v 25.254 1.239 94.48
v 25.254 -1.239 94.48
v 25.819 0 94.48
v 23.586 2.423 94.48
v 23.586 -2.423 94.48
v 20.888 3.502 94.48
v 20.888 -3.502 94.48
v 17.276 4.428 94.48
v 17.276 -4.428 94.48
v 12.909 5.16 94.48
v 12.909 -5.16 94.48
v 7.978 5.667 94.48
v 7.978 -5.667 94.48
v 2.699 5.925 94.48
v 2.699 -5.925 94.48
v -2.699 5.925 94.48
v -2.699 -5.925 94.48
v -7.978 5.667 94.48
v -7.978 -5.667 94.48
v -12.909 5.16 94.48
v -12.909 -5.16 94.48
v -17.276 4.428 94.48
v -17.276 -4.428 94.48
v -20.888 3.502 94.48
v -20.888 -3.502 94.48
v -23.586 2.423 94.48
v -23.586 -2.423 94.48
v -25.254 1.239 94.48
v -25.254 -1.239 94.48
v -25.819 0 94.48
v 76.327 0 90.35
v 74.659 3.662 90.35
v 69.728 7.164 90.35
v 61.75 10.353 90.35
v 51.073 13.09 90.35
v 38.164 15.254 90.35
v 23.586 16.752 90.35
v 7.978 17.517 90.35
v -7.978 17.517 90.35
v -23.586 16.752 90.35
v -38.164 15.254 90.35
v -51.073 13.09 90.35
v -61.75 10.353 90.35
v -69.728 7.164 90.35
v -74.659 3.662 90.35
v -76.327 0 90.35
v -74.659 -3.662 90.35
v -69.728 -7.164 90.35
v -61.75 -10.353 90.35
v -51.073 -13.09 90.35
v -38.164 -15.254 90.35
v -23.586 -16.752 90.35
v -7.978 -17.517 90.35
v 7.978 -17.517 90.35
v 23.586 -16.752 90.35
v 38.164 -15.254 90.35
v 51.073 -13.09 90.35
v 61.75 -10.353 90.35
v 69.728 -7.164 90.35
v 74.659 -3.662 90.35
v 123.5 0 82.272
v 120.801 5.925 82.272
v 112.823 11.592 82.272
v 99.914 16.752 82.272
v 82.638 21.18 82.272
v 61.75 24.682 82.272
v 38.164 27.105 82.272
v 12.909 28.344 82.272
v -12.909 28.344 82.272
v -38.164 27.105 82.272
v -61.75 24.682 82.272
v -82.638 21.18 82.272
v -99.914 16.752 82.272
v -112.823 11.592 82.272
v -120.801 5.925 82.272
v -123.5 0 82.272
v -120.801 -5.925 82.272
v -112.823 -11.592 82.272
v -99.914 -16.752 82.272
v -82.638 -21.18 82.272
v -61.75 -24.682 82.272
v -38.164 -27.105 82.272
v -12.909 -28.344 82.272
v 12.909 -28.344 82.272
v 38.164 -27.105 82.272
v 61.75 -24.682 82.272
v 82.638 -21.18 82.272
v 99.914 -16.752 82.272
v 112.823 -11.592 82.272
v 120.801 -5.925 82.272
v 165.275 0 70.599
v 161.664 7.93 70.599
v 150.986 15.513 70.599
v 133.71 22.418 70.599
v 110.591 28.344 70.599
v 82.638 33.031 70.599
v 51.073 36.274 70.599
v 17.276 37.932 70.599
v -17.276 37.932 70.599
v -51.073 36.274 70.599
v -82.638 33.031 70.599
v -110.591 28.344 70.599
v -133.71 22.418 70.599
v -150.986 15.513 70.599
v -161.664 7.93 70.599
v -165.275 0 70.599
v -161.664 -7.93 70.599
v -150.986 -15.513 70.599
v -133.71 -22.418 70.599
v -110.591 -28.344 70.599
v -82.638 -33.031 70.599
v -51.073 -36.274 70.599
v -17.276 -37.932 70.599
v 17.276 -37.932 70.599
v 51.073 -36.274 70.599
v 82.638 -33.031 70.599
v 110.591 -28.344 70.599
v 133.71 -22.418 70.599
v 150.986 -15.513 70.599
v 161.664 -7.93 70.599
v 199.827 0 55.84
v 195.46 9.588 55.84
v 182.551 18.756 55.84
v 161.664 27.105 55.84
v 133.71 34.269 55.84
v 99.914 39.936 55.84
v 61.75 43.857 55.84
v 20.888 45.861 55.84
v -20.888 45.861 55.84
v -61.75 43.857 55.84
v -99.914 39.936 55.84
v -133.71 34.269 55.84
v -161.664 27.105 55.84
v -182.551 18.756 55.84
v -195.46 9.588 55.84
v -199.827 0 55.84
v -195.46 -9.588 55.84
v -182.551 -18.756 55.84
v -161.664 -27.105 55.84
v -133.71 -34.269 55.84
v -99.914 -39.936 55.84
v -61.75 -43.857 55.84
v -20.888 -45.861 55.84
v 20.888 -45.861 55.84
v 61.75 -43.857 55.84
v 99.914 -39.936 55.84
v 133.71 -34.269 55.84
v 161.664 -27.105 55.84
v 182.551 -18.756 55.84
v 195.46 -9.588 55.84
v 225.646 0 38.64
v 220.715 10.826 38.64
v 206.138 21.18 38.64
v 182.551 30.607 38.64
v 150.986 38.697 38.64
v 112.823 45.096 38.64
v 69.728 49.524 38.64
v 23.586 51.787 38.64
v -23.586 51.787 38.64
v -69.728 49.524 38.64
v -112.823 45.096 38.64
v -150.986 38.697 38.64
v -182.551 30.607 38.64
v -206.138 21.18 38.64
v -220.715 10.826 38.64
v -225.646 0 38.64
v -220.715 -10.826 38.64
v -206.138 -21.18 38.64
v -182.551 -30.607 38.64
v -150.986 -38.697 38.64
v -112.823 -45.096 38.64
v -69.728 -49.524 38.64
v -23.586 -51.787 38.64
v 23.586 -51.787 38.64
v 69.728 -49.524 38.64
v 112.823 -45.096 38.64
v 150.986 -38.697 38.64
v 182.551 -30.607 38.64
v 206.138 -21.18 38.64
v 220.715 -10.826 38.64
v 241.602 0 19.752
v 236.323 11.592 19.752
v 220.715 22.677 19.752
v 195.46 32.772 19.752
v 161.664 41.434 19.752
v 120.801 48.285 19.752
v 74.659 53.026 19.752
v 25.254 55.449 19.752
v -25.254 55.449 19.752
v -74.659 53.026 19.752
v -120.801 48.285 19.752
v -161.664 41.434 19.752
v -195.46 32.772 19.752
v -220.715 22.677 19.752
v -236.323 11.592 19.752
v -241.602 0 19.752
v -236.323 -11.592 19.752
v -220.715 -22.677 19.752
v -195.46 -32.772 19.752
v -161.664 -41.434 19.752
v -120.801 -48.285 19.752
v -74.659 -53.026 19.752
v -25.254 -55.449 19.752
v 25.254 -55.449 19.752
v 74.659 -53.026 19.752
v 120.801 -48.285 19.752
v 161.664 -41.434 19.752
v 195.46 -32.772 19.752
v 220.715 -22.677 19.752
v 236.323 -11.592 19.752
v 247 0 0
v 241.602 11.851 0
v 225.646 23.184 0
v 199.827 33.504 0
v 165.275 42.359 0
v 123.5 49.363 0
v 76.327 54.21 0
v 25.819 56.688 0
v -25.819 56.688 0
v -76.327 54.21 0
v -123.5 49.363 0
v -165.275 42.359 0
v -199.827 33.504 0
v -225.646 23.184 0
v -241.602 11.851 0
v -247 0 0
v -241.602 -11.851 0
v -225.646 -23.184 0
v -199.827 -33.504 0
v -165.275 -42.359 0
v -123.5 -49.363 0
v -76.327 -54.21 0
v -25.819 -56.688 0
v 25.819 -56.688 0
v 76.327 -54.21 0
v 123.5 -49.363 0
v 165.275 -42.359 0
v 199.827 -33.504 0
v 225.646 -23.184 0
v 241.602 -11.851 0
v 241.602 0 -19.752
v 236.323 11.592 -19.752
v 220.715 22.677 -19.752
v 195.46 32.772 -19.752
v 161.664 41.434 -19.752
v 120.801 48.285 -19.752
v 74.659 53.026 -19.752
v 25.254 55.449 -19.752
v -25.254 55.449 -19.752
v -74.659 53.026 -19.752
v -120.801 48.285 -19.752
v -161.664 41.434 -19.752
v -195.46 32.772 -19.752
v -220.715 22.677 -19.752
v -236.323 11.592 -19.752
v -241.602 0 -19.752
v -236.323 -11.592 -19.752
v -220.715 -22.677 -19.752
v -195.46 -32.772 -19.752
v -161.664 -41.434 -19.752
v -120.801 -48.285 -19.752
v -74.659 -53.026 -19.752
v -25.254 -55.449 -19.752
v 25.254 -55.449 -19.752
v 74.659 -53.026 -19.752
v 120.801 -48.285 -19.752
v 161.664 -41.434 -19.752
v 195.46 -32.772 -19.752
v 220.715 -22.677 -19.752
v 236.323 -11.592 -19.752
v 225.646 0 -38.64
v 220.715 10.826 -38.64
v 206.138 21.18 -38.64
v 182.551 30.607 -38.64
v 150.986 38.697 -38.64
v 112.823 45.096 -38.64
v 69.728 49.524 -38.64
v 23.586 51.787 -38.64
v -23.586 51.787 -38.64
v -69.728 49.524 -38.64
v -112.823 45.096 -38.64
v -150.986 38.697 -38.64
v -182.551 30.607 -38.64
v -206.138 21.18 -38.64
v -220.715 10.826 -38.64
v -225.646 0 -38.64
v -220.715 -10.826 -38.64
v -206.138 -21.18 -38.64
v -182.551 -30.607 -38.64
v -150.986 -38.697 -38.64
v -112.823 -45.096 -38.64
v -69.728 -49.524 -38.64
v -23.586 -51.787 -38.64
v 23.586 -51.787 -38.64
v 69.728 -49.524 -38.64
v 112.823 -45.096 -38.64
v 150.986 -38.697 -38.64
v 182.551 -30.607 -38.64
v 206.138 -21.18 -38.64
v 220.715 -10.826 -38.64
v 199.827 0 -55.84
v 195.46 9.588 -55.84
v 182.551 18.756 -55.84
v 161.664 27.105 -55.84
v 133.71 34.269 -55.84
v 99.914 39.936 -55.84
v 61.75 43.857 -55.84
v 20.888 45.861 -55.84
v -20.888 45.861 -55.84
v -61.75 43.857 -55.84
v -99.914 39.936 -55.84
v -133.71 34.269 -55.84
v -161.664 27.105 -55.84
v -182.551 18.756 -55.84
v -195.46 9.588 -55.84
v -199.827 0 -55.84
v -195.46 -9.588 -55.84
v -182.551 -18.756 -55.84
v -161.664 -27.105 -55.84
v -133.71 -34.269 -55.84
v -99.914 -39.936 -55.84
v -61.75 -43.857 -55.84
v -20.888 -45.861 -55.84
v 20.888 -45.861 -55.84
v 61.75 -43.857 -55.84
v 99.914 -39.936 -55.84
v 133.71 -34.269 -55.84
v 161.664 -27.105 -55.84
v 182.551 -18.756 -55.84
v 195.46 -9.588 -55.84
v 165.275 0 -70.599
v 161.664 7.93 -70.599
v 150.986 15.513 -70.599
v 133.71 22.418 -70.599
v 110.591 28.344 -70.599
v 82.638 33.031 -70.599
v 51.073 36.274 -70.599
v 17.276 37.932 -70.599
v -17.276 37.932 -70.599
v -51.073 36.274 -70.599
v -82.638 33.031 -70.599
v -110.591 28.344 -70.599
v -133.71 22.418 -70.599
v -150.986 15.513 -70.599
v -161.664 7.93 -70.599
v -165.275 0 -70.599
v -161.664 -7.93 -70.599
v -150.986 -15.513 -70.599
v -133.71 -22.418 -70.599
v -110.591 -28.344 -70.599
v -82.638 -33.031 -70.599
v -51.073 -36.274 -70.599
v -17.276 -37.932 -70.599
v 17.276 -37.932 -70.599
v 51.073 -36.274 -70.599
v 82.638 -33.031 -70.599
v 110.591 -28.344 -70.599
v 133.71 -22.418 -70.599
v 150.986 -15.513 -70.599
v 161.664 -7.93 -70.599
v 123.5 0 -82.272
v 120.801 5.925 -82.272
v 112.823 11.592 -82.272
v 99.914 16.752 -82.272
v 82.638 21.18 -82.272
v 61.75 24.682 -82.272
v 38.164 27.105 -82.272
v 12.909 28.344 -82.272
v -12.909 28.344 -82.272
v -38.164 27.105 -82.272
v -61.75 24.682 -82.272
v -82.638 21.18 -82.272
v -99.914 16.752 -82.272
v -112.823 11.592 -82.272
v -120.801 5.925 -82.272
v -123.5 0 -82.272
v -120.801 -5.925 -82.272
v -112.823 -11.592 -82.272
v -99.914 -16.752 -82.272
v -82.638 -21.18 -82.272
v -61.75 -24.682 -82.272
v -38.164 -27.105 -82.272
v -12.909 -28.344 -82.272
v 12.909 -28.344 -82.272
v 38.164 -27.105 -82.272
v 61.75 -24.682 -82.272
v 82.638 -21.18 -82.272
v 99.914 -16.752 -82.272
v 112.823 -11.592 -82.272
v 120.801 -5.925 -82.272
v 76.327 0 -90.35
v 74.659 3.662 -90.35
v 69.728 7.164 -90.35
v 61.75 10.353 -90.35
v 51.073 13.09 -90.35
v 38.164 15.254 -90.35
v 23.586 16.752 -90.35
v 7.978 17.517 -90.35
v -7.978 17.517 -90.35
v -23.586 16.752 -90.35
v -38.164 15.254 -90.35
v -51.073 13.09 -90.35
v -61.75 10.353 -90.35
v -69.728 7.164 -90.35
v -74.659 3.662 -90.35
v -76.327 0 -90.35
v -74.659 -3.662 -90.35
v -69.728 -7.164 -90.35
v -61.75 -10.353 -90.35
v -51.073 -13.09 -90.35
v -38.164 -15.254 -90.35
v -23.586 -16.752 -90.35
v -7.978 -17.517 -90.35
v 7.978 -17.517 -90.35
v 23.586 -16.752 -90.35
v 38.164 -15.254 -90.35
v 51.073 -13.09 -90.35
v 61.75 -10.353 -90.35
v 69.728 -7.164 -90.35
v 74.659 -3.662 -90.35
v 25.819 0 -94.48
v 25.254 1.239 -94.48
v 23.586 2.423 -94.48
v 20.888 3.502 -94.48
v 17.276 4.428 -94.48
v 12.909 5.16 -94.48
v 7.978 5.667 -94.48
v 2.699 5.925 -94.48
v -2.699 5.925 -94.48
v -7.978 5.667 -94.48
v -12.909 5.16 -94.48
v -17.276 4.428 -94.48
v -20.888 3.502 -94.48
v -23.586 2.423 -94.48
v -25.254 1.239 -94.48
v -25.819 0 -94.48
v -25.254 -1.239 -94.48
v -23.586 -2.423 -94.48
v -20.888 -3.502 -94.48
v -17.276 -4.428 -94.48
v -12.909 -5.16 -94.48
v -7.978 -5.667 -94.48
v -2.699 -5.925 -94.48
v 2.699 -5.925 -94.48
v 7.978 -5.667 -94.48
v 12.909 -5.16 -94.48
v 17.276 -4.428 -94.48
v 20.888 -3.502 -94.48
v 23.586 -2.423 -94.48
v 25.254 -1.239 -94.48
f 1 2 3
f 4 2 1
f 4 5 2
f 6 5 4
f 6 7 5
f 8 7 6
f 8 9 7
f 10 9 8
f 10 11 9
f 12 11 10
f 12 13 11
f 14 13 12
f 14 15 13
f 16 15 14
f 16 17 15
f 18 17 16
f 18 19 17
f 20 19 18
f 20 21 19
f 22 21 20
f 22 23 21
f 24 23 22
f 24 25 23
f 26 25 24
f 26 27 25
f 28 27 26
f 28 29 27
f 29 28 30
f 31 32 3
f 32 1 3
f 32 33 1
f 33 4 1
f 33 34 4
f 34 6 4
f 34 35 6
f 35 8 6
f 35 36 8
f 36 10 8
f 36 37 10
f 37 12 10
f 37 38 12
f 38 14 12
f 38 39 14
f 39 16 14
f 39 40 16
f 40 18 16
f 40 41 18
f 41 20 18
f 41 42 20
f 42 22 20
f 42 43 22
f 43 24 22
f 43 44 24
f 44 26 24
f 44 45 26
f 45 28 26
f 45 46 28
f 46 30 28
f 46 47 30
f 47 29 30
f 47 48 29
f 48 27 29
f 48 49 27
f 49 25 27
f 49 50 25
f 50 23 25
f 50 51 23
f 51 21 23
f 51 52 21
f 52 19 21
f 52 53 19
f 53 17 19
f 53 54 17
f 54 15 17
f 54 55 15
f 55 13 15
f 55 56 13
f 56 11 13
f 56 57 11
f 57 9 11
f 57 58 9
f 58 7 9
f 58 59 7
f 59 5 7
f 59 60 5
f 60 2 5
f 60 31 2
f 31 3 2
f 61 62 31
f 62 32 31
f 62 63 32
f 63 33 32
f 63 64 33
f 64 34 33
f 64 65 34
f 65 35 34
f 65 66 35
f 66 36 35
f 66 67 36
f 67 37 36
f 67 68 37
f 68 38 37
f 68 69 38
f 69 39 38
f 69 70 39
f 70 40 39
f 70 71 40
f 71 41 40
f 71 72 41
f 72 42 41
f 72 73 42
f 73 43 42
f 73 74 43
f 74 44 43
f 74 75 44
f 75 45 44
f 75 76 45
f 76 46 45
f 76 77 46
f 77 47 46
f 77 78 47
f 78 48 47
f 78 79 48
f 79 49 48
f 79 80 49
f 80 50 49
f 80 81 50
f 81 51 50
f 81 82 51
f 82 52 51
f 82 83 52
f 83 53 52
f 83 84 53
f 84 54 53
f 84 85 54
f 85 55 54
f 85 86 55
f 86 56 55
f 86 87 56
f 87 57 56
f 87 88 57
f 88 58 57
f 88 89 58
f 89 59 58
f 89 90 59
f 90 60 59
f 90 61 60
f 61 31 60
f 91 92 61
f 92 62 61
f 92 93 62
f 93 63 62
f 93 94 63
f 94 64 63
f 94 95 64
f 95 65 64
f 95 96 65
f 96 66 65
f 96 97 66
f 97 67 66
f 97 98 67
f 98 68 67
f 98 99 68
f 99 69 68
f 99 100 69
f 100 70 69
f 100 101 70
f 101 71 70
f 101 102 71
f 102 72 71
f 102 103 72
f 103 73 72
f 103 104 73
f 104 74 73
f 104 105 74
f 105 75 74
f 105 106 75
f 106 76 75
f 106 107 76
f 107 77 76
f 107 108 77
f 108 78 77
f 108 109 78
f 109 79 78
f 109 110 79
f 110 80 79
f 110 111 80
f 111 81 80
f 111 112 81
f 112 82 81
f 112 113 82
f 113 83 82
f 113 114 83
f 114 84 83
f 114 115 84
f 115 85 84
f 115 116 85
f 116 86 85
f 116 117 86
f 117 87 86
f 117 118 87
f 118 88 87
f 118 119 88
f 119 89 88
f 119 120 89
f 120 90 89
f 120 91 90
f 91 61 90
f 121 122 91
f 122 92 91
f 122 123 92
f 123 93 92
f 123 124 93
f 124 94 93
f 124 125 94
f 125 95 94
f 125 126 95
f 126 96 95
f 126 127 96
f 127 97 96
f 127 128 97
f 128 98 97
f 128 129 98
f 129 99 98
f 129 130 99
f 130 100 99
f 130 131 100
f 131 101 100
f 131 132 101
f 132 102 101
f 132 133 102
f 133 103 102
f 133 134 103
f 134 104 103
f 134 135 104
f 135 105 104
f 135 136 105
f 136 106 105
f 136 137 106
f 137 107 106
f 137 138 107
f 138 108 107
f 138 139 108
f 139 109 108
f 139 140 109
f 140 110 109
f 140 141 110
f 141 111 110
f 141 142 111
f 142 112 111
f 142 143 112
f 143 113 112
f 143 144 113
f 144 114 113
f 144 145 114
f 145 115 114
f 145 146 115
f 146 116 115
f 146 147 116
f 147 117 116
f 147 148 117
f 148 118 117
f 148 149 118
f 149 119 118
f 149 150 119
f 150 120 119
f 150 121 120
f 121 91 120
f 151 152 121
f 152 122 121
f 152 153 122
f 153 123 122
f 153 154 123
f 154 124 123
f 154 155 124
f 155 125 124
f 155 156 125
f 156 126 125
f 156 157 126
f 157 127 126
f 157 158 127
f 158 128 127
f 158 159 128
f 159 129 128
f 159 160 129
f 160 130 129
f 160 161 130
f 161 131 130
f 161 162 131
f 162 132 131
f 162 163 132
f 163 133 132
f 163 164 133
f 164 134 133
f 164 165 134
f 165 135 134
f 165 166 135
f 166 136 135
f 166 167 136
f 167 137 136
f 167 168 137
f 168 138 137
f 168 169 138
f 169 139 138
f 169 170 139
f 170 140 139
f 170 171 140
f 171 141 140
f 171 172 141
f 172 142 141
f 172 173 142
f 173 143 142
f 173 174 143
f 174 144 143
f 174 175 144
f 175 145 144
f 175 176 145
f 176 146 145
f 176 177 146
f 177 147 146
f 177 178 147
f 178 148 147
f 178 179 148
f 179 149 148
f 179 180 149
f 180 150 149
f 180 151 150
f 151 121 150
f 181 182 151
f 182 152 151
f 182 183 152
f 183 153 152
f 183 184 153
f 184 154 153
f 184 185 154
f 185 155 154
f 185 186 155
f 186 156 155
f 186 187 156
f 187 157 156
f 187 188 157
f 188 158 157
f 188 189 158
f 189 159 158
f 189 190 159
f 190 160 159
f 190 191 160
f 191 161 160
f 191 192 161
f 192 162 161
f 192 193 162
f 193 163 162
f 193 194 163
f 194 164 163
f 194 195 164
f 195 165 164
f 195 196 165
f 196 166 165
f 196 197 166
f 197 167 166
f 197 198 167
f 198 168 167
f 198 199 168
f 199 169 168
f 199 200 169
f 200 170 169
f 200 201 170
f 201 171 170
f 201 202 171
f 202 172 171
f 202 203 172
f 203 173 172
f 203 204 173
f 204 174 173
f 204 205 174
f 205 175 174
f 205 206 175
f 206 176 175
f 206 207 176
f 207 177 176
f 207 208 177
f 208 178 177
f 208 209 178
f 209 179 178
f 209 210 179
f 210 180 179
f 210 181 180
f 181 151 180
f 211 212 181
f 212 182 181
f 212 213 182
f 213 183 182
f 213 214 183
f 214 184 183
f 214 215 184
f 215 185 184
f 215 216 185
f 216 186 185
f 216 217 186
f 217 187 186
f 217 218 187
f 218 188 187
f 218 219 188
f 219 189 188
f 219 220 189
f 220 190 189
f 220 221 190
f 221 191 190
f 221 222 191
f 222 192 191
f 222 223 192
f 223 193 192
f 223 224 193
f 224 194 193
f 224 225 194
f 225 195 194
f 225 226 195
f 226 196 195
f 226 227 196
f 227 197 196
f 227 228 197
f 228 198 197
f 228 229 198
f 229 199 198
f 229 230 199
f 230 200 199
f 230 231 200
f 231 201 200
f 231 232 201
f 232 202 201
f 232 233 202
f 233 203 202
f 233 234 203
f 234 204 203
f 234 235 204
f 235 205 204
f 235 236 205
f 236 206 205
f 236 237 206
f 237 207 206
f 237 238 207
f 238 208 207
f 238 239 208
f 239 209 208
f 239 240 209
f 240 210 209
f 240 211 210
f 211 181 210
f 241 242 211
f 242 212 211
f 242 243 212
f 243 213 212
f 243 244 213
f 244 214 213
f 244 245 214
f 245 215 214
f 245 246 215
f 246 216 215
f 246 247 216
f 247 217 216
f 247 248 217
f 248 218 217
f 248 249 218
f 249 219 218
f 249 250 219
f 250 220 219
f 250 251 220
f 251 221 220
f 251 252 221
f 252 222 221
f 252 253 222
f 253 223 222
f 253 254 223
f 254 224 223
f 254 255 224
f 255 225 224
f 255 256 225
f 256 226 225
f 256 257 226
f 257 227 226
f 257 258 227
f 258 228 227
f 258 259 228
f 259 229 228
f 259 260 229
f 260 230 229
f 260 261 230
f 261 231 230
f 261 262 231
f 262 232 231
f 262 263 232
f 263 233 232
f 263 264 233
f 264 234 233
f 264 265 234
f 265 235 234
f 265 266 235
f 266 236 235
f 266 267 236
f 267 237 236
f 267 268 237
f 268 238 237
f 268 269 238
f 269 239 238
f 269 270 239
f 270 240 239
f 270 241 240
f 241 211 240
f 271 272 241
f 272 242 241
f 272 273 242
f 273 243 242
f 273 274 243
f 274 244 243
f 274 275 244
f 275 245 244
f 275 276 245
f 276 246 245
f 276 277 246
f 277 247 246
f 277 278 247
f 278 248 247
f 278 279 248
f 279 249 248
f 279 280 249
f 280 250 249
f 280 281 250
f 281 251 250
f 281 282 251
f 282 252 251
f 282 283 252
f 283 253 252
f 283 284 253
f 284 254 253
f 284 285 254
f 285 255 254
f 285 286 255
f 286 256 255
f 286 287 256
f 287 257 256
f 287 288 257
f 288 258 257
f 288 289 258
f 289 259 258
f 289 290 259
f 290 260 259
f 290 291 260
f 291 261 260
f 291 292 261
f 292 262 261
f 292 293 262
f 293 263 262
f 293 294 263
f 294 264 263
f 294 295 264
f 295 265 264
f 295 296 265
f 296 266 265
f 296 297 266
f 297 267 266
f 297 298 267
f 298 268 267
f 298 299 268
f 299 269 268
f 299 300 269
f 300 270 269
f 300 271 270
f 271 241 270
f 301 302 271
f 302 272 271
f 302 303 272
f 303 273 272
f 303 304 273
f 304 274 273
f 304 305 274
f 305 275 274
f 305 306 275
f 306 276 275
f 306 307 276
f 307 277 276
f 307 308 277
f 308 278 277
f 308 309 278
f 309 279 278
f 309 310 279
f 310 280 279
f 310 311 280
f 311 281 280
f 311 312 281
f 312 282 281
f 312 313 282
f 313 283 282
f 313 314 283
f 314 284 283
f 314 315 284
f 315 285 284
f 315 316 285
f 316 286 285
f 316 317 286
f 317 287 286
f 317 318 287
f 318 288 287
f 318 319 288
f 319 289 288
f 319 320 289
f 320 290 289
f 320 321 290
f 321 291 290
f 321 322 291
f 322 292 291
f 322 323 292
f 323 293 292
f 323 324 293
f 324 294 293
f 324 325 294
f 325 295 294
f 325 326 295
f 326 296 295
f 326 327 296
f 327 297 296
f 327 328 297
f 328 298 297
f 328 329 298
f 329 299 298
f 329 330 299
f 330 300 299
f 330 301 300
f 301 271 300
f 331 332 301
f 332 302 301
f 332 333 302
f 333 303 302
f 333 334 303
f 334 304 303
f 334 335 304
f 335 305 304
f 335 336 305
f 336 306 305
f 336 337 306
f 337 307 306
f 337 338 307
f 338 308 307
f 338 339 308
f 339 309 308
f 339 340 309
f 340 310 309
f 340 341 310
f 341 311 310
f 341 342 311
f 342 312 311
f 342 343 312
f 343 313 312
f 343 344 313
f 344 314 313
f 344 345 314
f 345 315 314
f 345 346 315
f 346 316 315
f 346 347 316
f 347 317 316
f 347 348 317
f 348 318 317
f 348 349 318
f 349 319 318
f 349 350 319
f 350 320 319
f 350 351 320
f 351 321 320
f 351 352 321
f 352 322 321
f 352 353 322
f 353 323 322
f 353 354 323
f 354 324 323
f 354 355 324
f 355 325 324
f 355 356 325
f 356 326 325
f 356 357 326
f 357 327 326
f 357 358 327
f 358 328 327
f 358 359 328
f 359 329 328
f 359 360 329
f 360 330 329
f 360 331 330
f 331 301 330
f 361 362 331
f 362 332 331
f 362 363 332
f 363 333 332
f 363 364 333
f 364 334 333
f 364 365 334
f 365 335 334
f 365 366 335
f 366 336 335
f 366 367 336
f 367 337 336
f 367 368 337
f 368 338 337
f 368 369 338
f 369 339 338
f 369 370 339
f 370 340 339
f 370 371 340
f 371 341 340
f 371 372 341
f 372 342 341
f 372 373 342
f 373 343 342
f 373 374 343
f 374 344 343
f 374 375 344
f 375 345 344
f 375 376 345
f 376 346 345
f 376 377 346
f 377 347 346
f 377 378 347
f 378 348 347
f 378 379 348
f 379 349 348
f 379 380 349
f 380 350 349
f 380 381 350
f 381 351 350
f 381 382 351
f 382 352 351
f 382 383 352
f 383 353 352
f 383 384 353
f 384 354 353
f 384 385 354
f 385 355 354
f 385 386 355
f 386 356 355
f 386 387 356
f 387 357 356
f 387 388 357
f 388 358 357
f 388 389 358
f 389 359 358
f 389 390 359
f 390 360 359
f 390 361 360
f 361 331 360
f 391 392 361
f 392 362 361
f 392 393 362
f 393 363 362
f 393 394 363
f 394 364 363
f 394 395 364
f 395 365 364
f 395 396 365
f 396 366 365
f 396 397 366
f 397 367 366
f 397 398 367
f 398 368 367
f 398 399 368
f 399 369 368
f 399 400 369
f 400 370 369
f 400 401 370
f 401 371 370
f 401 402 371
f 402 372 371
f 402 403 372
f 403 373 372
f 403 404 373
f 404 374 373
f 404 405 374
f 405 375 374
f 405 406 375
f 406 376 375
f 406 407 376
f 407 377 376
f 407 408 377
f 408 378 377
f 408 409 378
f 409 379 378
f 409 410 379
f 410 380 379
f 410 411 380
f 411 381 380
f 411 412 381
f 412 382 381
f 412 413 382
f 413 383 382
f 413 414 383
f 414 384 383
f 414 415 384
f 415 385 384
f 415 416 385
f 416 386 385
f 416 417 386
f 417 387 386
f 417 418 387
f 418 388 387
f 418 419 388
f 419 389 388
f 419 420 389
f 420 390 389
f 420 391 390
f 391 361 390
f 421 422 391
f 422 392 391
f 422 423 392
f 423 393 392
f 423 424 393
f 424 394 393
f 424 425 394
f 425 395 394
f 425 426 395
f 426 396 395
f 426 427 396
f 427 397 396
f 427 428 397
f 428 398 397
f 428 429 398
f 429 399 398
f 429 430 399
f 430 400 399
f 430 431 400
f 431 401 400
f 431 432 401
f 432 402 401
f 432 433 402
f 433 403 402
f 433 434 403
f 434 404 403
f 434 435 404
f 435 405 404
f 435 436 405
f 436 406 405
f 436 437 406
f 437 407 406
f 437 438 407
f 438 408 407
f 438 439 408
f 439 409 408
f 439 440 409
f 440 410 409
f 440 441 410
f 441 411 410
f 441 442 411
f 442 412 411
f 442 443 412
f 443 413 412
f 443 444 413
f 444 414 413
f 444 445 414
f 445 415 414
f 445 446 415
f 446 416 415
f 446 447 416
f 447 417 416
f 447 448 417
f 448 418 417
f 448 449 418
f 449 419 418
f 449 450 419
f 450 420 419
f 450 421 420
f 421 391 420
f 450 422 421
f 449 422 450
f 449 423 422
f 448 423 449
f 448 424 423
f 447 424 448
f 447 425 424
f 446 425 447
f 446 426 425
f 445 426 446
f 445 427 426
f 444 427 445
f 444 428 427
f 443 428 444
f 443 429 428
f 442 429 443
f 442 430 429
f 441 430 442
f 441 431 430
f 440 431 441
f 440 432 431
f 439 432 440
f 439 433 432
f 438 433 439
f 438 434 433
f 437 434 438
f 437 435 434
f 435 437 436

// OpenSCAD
// Generated by SolidPython 1.0.1 on 2020-07-29 00:46:50


scale(v = [13, 3, 5]) {
	sphere(r = 19);
}
/***********************************************
*********      SolidPython code:      **********
************************************************
 
# import packages: SolidPython
from solid import *
from solid.utils import *
from itertools import chain, combinations, permutations


class Resize:

    def __init__(self, scad_file):
        self.scad_file = scad_file
        #self.scad_file = import_scad(scad_file)
        # cone/cylinder param:
        self.r1 = 0
        self.r2 = 0
        self.h = 0
        # rectangular prism param:
        self.w = 0
        self.l = 0
        # ellipse param:
        self.r = 0

    # import OpenScad code (file name corresponds to shape)


    # classify shape + parameters
    def assign(self, param1, param2, param3):
        if self.scad_file == 'cone.scad':
            self.r1 = param1
            self.r2 = param2
            self.h = param3
        elif self.scad_file == 'cylinder.scad':
            self.r1 = param1
            self.r2 = param2
            self.h = param3
        elif self.scad_file == 'rectangularPrism.scad':
            self.h = param1
            self.l = param2
            self.w = param3
        else:
            self.r = param1
            self.h = param2

    # resize parameters
    def iterate(self):
        x = range(3, 20, 2)
        i = 1
        if self.scad_file == 'cone.scad':
            tempList = list(permutations(x, 2))
            for temp in tempList:
                param1 = temp[0]
                param2 = temp[1]
                filepath = 'produced_scad_files/' + 'cone' + str(param1) + '_' + str(param2) + '_' + '.scad'
                scad_render_to_file(cylinder(h=param1, r1=param2, r2=0), filepath)

        elif self.scad_file == 'cylinder.scad':
            tempList = list(permutations(x, 3))
            for temp in tempList:
                param1 = temp[0]
                param2 = temp[1]
                filepath = 'produced_scad_files/' + 'cylinder' + str(param1) + '_' + str(param2) + '_' + '.scad'
                scad_render_to_file(cylinder(h=param1, r1=param2, r2=param2), filepath)

        elif self.scad_file == 'rectangularPrism.scad':
            tempList = list(permutations(x, 3))
            for temp in tempList:
                param1 = temp[0]
                param2 = temp[1]
                param3 = temp[2]
                filepath = 'produced_scad_files/' + 'rectangularPrism' + str(param1) + '_' + str(param2) + '_' + str(
                    param3) + '.scad'
                scad_render_to_file(cube(size=(param1, param2, param3)), filepath)

        elif self.scad_file == 'ellipse.scad':
            tempList = list(permutations(x, 4))
            for temp in tempList:
                param1 = temp[0]
                param2 = temp[1]
                param3 = temp[2]
                param4 = temp[3]
                filepath = 'produced_scad_files/' + 'ellipse' + str(param1) + '_' + str(param2) + '_' + str(param3) + '_' + str(param4) + '.scad'
                scad_render_to_file(scale([param1, param2, param3])(sphere(r=param4)), filepath)

    def render_to_scadfile(self):
        scad_render_to_file(scad, 'example.scad') 
 
************************************************/
